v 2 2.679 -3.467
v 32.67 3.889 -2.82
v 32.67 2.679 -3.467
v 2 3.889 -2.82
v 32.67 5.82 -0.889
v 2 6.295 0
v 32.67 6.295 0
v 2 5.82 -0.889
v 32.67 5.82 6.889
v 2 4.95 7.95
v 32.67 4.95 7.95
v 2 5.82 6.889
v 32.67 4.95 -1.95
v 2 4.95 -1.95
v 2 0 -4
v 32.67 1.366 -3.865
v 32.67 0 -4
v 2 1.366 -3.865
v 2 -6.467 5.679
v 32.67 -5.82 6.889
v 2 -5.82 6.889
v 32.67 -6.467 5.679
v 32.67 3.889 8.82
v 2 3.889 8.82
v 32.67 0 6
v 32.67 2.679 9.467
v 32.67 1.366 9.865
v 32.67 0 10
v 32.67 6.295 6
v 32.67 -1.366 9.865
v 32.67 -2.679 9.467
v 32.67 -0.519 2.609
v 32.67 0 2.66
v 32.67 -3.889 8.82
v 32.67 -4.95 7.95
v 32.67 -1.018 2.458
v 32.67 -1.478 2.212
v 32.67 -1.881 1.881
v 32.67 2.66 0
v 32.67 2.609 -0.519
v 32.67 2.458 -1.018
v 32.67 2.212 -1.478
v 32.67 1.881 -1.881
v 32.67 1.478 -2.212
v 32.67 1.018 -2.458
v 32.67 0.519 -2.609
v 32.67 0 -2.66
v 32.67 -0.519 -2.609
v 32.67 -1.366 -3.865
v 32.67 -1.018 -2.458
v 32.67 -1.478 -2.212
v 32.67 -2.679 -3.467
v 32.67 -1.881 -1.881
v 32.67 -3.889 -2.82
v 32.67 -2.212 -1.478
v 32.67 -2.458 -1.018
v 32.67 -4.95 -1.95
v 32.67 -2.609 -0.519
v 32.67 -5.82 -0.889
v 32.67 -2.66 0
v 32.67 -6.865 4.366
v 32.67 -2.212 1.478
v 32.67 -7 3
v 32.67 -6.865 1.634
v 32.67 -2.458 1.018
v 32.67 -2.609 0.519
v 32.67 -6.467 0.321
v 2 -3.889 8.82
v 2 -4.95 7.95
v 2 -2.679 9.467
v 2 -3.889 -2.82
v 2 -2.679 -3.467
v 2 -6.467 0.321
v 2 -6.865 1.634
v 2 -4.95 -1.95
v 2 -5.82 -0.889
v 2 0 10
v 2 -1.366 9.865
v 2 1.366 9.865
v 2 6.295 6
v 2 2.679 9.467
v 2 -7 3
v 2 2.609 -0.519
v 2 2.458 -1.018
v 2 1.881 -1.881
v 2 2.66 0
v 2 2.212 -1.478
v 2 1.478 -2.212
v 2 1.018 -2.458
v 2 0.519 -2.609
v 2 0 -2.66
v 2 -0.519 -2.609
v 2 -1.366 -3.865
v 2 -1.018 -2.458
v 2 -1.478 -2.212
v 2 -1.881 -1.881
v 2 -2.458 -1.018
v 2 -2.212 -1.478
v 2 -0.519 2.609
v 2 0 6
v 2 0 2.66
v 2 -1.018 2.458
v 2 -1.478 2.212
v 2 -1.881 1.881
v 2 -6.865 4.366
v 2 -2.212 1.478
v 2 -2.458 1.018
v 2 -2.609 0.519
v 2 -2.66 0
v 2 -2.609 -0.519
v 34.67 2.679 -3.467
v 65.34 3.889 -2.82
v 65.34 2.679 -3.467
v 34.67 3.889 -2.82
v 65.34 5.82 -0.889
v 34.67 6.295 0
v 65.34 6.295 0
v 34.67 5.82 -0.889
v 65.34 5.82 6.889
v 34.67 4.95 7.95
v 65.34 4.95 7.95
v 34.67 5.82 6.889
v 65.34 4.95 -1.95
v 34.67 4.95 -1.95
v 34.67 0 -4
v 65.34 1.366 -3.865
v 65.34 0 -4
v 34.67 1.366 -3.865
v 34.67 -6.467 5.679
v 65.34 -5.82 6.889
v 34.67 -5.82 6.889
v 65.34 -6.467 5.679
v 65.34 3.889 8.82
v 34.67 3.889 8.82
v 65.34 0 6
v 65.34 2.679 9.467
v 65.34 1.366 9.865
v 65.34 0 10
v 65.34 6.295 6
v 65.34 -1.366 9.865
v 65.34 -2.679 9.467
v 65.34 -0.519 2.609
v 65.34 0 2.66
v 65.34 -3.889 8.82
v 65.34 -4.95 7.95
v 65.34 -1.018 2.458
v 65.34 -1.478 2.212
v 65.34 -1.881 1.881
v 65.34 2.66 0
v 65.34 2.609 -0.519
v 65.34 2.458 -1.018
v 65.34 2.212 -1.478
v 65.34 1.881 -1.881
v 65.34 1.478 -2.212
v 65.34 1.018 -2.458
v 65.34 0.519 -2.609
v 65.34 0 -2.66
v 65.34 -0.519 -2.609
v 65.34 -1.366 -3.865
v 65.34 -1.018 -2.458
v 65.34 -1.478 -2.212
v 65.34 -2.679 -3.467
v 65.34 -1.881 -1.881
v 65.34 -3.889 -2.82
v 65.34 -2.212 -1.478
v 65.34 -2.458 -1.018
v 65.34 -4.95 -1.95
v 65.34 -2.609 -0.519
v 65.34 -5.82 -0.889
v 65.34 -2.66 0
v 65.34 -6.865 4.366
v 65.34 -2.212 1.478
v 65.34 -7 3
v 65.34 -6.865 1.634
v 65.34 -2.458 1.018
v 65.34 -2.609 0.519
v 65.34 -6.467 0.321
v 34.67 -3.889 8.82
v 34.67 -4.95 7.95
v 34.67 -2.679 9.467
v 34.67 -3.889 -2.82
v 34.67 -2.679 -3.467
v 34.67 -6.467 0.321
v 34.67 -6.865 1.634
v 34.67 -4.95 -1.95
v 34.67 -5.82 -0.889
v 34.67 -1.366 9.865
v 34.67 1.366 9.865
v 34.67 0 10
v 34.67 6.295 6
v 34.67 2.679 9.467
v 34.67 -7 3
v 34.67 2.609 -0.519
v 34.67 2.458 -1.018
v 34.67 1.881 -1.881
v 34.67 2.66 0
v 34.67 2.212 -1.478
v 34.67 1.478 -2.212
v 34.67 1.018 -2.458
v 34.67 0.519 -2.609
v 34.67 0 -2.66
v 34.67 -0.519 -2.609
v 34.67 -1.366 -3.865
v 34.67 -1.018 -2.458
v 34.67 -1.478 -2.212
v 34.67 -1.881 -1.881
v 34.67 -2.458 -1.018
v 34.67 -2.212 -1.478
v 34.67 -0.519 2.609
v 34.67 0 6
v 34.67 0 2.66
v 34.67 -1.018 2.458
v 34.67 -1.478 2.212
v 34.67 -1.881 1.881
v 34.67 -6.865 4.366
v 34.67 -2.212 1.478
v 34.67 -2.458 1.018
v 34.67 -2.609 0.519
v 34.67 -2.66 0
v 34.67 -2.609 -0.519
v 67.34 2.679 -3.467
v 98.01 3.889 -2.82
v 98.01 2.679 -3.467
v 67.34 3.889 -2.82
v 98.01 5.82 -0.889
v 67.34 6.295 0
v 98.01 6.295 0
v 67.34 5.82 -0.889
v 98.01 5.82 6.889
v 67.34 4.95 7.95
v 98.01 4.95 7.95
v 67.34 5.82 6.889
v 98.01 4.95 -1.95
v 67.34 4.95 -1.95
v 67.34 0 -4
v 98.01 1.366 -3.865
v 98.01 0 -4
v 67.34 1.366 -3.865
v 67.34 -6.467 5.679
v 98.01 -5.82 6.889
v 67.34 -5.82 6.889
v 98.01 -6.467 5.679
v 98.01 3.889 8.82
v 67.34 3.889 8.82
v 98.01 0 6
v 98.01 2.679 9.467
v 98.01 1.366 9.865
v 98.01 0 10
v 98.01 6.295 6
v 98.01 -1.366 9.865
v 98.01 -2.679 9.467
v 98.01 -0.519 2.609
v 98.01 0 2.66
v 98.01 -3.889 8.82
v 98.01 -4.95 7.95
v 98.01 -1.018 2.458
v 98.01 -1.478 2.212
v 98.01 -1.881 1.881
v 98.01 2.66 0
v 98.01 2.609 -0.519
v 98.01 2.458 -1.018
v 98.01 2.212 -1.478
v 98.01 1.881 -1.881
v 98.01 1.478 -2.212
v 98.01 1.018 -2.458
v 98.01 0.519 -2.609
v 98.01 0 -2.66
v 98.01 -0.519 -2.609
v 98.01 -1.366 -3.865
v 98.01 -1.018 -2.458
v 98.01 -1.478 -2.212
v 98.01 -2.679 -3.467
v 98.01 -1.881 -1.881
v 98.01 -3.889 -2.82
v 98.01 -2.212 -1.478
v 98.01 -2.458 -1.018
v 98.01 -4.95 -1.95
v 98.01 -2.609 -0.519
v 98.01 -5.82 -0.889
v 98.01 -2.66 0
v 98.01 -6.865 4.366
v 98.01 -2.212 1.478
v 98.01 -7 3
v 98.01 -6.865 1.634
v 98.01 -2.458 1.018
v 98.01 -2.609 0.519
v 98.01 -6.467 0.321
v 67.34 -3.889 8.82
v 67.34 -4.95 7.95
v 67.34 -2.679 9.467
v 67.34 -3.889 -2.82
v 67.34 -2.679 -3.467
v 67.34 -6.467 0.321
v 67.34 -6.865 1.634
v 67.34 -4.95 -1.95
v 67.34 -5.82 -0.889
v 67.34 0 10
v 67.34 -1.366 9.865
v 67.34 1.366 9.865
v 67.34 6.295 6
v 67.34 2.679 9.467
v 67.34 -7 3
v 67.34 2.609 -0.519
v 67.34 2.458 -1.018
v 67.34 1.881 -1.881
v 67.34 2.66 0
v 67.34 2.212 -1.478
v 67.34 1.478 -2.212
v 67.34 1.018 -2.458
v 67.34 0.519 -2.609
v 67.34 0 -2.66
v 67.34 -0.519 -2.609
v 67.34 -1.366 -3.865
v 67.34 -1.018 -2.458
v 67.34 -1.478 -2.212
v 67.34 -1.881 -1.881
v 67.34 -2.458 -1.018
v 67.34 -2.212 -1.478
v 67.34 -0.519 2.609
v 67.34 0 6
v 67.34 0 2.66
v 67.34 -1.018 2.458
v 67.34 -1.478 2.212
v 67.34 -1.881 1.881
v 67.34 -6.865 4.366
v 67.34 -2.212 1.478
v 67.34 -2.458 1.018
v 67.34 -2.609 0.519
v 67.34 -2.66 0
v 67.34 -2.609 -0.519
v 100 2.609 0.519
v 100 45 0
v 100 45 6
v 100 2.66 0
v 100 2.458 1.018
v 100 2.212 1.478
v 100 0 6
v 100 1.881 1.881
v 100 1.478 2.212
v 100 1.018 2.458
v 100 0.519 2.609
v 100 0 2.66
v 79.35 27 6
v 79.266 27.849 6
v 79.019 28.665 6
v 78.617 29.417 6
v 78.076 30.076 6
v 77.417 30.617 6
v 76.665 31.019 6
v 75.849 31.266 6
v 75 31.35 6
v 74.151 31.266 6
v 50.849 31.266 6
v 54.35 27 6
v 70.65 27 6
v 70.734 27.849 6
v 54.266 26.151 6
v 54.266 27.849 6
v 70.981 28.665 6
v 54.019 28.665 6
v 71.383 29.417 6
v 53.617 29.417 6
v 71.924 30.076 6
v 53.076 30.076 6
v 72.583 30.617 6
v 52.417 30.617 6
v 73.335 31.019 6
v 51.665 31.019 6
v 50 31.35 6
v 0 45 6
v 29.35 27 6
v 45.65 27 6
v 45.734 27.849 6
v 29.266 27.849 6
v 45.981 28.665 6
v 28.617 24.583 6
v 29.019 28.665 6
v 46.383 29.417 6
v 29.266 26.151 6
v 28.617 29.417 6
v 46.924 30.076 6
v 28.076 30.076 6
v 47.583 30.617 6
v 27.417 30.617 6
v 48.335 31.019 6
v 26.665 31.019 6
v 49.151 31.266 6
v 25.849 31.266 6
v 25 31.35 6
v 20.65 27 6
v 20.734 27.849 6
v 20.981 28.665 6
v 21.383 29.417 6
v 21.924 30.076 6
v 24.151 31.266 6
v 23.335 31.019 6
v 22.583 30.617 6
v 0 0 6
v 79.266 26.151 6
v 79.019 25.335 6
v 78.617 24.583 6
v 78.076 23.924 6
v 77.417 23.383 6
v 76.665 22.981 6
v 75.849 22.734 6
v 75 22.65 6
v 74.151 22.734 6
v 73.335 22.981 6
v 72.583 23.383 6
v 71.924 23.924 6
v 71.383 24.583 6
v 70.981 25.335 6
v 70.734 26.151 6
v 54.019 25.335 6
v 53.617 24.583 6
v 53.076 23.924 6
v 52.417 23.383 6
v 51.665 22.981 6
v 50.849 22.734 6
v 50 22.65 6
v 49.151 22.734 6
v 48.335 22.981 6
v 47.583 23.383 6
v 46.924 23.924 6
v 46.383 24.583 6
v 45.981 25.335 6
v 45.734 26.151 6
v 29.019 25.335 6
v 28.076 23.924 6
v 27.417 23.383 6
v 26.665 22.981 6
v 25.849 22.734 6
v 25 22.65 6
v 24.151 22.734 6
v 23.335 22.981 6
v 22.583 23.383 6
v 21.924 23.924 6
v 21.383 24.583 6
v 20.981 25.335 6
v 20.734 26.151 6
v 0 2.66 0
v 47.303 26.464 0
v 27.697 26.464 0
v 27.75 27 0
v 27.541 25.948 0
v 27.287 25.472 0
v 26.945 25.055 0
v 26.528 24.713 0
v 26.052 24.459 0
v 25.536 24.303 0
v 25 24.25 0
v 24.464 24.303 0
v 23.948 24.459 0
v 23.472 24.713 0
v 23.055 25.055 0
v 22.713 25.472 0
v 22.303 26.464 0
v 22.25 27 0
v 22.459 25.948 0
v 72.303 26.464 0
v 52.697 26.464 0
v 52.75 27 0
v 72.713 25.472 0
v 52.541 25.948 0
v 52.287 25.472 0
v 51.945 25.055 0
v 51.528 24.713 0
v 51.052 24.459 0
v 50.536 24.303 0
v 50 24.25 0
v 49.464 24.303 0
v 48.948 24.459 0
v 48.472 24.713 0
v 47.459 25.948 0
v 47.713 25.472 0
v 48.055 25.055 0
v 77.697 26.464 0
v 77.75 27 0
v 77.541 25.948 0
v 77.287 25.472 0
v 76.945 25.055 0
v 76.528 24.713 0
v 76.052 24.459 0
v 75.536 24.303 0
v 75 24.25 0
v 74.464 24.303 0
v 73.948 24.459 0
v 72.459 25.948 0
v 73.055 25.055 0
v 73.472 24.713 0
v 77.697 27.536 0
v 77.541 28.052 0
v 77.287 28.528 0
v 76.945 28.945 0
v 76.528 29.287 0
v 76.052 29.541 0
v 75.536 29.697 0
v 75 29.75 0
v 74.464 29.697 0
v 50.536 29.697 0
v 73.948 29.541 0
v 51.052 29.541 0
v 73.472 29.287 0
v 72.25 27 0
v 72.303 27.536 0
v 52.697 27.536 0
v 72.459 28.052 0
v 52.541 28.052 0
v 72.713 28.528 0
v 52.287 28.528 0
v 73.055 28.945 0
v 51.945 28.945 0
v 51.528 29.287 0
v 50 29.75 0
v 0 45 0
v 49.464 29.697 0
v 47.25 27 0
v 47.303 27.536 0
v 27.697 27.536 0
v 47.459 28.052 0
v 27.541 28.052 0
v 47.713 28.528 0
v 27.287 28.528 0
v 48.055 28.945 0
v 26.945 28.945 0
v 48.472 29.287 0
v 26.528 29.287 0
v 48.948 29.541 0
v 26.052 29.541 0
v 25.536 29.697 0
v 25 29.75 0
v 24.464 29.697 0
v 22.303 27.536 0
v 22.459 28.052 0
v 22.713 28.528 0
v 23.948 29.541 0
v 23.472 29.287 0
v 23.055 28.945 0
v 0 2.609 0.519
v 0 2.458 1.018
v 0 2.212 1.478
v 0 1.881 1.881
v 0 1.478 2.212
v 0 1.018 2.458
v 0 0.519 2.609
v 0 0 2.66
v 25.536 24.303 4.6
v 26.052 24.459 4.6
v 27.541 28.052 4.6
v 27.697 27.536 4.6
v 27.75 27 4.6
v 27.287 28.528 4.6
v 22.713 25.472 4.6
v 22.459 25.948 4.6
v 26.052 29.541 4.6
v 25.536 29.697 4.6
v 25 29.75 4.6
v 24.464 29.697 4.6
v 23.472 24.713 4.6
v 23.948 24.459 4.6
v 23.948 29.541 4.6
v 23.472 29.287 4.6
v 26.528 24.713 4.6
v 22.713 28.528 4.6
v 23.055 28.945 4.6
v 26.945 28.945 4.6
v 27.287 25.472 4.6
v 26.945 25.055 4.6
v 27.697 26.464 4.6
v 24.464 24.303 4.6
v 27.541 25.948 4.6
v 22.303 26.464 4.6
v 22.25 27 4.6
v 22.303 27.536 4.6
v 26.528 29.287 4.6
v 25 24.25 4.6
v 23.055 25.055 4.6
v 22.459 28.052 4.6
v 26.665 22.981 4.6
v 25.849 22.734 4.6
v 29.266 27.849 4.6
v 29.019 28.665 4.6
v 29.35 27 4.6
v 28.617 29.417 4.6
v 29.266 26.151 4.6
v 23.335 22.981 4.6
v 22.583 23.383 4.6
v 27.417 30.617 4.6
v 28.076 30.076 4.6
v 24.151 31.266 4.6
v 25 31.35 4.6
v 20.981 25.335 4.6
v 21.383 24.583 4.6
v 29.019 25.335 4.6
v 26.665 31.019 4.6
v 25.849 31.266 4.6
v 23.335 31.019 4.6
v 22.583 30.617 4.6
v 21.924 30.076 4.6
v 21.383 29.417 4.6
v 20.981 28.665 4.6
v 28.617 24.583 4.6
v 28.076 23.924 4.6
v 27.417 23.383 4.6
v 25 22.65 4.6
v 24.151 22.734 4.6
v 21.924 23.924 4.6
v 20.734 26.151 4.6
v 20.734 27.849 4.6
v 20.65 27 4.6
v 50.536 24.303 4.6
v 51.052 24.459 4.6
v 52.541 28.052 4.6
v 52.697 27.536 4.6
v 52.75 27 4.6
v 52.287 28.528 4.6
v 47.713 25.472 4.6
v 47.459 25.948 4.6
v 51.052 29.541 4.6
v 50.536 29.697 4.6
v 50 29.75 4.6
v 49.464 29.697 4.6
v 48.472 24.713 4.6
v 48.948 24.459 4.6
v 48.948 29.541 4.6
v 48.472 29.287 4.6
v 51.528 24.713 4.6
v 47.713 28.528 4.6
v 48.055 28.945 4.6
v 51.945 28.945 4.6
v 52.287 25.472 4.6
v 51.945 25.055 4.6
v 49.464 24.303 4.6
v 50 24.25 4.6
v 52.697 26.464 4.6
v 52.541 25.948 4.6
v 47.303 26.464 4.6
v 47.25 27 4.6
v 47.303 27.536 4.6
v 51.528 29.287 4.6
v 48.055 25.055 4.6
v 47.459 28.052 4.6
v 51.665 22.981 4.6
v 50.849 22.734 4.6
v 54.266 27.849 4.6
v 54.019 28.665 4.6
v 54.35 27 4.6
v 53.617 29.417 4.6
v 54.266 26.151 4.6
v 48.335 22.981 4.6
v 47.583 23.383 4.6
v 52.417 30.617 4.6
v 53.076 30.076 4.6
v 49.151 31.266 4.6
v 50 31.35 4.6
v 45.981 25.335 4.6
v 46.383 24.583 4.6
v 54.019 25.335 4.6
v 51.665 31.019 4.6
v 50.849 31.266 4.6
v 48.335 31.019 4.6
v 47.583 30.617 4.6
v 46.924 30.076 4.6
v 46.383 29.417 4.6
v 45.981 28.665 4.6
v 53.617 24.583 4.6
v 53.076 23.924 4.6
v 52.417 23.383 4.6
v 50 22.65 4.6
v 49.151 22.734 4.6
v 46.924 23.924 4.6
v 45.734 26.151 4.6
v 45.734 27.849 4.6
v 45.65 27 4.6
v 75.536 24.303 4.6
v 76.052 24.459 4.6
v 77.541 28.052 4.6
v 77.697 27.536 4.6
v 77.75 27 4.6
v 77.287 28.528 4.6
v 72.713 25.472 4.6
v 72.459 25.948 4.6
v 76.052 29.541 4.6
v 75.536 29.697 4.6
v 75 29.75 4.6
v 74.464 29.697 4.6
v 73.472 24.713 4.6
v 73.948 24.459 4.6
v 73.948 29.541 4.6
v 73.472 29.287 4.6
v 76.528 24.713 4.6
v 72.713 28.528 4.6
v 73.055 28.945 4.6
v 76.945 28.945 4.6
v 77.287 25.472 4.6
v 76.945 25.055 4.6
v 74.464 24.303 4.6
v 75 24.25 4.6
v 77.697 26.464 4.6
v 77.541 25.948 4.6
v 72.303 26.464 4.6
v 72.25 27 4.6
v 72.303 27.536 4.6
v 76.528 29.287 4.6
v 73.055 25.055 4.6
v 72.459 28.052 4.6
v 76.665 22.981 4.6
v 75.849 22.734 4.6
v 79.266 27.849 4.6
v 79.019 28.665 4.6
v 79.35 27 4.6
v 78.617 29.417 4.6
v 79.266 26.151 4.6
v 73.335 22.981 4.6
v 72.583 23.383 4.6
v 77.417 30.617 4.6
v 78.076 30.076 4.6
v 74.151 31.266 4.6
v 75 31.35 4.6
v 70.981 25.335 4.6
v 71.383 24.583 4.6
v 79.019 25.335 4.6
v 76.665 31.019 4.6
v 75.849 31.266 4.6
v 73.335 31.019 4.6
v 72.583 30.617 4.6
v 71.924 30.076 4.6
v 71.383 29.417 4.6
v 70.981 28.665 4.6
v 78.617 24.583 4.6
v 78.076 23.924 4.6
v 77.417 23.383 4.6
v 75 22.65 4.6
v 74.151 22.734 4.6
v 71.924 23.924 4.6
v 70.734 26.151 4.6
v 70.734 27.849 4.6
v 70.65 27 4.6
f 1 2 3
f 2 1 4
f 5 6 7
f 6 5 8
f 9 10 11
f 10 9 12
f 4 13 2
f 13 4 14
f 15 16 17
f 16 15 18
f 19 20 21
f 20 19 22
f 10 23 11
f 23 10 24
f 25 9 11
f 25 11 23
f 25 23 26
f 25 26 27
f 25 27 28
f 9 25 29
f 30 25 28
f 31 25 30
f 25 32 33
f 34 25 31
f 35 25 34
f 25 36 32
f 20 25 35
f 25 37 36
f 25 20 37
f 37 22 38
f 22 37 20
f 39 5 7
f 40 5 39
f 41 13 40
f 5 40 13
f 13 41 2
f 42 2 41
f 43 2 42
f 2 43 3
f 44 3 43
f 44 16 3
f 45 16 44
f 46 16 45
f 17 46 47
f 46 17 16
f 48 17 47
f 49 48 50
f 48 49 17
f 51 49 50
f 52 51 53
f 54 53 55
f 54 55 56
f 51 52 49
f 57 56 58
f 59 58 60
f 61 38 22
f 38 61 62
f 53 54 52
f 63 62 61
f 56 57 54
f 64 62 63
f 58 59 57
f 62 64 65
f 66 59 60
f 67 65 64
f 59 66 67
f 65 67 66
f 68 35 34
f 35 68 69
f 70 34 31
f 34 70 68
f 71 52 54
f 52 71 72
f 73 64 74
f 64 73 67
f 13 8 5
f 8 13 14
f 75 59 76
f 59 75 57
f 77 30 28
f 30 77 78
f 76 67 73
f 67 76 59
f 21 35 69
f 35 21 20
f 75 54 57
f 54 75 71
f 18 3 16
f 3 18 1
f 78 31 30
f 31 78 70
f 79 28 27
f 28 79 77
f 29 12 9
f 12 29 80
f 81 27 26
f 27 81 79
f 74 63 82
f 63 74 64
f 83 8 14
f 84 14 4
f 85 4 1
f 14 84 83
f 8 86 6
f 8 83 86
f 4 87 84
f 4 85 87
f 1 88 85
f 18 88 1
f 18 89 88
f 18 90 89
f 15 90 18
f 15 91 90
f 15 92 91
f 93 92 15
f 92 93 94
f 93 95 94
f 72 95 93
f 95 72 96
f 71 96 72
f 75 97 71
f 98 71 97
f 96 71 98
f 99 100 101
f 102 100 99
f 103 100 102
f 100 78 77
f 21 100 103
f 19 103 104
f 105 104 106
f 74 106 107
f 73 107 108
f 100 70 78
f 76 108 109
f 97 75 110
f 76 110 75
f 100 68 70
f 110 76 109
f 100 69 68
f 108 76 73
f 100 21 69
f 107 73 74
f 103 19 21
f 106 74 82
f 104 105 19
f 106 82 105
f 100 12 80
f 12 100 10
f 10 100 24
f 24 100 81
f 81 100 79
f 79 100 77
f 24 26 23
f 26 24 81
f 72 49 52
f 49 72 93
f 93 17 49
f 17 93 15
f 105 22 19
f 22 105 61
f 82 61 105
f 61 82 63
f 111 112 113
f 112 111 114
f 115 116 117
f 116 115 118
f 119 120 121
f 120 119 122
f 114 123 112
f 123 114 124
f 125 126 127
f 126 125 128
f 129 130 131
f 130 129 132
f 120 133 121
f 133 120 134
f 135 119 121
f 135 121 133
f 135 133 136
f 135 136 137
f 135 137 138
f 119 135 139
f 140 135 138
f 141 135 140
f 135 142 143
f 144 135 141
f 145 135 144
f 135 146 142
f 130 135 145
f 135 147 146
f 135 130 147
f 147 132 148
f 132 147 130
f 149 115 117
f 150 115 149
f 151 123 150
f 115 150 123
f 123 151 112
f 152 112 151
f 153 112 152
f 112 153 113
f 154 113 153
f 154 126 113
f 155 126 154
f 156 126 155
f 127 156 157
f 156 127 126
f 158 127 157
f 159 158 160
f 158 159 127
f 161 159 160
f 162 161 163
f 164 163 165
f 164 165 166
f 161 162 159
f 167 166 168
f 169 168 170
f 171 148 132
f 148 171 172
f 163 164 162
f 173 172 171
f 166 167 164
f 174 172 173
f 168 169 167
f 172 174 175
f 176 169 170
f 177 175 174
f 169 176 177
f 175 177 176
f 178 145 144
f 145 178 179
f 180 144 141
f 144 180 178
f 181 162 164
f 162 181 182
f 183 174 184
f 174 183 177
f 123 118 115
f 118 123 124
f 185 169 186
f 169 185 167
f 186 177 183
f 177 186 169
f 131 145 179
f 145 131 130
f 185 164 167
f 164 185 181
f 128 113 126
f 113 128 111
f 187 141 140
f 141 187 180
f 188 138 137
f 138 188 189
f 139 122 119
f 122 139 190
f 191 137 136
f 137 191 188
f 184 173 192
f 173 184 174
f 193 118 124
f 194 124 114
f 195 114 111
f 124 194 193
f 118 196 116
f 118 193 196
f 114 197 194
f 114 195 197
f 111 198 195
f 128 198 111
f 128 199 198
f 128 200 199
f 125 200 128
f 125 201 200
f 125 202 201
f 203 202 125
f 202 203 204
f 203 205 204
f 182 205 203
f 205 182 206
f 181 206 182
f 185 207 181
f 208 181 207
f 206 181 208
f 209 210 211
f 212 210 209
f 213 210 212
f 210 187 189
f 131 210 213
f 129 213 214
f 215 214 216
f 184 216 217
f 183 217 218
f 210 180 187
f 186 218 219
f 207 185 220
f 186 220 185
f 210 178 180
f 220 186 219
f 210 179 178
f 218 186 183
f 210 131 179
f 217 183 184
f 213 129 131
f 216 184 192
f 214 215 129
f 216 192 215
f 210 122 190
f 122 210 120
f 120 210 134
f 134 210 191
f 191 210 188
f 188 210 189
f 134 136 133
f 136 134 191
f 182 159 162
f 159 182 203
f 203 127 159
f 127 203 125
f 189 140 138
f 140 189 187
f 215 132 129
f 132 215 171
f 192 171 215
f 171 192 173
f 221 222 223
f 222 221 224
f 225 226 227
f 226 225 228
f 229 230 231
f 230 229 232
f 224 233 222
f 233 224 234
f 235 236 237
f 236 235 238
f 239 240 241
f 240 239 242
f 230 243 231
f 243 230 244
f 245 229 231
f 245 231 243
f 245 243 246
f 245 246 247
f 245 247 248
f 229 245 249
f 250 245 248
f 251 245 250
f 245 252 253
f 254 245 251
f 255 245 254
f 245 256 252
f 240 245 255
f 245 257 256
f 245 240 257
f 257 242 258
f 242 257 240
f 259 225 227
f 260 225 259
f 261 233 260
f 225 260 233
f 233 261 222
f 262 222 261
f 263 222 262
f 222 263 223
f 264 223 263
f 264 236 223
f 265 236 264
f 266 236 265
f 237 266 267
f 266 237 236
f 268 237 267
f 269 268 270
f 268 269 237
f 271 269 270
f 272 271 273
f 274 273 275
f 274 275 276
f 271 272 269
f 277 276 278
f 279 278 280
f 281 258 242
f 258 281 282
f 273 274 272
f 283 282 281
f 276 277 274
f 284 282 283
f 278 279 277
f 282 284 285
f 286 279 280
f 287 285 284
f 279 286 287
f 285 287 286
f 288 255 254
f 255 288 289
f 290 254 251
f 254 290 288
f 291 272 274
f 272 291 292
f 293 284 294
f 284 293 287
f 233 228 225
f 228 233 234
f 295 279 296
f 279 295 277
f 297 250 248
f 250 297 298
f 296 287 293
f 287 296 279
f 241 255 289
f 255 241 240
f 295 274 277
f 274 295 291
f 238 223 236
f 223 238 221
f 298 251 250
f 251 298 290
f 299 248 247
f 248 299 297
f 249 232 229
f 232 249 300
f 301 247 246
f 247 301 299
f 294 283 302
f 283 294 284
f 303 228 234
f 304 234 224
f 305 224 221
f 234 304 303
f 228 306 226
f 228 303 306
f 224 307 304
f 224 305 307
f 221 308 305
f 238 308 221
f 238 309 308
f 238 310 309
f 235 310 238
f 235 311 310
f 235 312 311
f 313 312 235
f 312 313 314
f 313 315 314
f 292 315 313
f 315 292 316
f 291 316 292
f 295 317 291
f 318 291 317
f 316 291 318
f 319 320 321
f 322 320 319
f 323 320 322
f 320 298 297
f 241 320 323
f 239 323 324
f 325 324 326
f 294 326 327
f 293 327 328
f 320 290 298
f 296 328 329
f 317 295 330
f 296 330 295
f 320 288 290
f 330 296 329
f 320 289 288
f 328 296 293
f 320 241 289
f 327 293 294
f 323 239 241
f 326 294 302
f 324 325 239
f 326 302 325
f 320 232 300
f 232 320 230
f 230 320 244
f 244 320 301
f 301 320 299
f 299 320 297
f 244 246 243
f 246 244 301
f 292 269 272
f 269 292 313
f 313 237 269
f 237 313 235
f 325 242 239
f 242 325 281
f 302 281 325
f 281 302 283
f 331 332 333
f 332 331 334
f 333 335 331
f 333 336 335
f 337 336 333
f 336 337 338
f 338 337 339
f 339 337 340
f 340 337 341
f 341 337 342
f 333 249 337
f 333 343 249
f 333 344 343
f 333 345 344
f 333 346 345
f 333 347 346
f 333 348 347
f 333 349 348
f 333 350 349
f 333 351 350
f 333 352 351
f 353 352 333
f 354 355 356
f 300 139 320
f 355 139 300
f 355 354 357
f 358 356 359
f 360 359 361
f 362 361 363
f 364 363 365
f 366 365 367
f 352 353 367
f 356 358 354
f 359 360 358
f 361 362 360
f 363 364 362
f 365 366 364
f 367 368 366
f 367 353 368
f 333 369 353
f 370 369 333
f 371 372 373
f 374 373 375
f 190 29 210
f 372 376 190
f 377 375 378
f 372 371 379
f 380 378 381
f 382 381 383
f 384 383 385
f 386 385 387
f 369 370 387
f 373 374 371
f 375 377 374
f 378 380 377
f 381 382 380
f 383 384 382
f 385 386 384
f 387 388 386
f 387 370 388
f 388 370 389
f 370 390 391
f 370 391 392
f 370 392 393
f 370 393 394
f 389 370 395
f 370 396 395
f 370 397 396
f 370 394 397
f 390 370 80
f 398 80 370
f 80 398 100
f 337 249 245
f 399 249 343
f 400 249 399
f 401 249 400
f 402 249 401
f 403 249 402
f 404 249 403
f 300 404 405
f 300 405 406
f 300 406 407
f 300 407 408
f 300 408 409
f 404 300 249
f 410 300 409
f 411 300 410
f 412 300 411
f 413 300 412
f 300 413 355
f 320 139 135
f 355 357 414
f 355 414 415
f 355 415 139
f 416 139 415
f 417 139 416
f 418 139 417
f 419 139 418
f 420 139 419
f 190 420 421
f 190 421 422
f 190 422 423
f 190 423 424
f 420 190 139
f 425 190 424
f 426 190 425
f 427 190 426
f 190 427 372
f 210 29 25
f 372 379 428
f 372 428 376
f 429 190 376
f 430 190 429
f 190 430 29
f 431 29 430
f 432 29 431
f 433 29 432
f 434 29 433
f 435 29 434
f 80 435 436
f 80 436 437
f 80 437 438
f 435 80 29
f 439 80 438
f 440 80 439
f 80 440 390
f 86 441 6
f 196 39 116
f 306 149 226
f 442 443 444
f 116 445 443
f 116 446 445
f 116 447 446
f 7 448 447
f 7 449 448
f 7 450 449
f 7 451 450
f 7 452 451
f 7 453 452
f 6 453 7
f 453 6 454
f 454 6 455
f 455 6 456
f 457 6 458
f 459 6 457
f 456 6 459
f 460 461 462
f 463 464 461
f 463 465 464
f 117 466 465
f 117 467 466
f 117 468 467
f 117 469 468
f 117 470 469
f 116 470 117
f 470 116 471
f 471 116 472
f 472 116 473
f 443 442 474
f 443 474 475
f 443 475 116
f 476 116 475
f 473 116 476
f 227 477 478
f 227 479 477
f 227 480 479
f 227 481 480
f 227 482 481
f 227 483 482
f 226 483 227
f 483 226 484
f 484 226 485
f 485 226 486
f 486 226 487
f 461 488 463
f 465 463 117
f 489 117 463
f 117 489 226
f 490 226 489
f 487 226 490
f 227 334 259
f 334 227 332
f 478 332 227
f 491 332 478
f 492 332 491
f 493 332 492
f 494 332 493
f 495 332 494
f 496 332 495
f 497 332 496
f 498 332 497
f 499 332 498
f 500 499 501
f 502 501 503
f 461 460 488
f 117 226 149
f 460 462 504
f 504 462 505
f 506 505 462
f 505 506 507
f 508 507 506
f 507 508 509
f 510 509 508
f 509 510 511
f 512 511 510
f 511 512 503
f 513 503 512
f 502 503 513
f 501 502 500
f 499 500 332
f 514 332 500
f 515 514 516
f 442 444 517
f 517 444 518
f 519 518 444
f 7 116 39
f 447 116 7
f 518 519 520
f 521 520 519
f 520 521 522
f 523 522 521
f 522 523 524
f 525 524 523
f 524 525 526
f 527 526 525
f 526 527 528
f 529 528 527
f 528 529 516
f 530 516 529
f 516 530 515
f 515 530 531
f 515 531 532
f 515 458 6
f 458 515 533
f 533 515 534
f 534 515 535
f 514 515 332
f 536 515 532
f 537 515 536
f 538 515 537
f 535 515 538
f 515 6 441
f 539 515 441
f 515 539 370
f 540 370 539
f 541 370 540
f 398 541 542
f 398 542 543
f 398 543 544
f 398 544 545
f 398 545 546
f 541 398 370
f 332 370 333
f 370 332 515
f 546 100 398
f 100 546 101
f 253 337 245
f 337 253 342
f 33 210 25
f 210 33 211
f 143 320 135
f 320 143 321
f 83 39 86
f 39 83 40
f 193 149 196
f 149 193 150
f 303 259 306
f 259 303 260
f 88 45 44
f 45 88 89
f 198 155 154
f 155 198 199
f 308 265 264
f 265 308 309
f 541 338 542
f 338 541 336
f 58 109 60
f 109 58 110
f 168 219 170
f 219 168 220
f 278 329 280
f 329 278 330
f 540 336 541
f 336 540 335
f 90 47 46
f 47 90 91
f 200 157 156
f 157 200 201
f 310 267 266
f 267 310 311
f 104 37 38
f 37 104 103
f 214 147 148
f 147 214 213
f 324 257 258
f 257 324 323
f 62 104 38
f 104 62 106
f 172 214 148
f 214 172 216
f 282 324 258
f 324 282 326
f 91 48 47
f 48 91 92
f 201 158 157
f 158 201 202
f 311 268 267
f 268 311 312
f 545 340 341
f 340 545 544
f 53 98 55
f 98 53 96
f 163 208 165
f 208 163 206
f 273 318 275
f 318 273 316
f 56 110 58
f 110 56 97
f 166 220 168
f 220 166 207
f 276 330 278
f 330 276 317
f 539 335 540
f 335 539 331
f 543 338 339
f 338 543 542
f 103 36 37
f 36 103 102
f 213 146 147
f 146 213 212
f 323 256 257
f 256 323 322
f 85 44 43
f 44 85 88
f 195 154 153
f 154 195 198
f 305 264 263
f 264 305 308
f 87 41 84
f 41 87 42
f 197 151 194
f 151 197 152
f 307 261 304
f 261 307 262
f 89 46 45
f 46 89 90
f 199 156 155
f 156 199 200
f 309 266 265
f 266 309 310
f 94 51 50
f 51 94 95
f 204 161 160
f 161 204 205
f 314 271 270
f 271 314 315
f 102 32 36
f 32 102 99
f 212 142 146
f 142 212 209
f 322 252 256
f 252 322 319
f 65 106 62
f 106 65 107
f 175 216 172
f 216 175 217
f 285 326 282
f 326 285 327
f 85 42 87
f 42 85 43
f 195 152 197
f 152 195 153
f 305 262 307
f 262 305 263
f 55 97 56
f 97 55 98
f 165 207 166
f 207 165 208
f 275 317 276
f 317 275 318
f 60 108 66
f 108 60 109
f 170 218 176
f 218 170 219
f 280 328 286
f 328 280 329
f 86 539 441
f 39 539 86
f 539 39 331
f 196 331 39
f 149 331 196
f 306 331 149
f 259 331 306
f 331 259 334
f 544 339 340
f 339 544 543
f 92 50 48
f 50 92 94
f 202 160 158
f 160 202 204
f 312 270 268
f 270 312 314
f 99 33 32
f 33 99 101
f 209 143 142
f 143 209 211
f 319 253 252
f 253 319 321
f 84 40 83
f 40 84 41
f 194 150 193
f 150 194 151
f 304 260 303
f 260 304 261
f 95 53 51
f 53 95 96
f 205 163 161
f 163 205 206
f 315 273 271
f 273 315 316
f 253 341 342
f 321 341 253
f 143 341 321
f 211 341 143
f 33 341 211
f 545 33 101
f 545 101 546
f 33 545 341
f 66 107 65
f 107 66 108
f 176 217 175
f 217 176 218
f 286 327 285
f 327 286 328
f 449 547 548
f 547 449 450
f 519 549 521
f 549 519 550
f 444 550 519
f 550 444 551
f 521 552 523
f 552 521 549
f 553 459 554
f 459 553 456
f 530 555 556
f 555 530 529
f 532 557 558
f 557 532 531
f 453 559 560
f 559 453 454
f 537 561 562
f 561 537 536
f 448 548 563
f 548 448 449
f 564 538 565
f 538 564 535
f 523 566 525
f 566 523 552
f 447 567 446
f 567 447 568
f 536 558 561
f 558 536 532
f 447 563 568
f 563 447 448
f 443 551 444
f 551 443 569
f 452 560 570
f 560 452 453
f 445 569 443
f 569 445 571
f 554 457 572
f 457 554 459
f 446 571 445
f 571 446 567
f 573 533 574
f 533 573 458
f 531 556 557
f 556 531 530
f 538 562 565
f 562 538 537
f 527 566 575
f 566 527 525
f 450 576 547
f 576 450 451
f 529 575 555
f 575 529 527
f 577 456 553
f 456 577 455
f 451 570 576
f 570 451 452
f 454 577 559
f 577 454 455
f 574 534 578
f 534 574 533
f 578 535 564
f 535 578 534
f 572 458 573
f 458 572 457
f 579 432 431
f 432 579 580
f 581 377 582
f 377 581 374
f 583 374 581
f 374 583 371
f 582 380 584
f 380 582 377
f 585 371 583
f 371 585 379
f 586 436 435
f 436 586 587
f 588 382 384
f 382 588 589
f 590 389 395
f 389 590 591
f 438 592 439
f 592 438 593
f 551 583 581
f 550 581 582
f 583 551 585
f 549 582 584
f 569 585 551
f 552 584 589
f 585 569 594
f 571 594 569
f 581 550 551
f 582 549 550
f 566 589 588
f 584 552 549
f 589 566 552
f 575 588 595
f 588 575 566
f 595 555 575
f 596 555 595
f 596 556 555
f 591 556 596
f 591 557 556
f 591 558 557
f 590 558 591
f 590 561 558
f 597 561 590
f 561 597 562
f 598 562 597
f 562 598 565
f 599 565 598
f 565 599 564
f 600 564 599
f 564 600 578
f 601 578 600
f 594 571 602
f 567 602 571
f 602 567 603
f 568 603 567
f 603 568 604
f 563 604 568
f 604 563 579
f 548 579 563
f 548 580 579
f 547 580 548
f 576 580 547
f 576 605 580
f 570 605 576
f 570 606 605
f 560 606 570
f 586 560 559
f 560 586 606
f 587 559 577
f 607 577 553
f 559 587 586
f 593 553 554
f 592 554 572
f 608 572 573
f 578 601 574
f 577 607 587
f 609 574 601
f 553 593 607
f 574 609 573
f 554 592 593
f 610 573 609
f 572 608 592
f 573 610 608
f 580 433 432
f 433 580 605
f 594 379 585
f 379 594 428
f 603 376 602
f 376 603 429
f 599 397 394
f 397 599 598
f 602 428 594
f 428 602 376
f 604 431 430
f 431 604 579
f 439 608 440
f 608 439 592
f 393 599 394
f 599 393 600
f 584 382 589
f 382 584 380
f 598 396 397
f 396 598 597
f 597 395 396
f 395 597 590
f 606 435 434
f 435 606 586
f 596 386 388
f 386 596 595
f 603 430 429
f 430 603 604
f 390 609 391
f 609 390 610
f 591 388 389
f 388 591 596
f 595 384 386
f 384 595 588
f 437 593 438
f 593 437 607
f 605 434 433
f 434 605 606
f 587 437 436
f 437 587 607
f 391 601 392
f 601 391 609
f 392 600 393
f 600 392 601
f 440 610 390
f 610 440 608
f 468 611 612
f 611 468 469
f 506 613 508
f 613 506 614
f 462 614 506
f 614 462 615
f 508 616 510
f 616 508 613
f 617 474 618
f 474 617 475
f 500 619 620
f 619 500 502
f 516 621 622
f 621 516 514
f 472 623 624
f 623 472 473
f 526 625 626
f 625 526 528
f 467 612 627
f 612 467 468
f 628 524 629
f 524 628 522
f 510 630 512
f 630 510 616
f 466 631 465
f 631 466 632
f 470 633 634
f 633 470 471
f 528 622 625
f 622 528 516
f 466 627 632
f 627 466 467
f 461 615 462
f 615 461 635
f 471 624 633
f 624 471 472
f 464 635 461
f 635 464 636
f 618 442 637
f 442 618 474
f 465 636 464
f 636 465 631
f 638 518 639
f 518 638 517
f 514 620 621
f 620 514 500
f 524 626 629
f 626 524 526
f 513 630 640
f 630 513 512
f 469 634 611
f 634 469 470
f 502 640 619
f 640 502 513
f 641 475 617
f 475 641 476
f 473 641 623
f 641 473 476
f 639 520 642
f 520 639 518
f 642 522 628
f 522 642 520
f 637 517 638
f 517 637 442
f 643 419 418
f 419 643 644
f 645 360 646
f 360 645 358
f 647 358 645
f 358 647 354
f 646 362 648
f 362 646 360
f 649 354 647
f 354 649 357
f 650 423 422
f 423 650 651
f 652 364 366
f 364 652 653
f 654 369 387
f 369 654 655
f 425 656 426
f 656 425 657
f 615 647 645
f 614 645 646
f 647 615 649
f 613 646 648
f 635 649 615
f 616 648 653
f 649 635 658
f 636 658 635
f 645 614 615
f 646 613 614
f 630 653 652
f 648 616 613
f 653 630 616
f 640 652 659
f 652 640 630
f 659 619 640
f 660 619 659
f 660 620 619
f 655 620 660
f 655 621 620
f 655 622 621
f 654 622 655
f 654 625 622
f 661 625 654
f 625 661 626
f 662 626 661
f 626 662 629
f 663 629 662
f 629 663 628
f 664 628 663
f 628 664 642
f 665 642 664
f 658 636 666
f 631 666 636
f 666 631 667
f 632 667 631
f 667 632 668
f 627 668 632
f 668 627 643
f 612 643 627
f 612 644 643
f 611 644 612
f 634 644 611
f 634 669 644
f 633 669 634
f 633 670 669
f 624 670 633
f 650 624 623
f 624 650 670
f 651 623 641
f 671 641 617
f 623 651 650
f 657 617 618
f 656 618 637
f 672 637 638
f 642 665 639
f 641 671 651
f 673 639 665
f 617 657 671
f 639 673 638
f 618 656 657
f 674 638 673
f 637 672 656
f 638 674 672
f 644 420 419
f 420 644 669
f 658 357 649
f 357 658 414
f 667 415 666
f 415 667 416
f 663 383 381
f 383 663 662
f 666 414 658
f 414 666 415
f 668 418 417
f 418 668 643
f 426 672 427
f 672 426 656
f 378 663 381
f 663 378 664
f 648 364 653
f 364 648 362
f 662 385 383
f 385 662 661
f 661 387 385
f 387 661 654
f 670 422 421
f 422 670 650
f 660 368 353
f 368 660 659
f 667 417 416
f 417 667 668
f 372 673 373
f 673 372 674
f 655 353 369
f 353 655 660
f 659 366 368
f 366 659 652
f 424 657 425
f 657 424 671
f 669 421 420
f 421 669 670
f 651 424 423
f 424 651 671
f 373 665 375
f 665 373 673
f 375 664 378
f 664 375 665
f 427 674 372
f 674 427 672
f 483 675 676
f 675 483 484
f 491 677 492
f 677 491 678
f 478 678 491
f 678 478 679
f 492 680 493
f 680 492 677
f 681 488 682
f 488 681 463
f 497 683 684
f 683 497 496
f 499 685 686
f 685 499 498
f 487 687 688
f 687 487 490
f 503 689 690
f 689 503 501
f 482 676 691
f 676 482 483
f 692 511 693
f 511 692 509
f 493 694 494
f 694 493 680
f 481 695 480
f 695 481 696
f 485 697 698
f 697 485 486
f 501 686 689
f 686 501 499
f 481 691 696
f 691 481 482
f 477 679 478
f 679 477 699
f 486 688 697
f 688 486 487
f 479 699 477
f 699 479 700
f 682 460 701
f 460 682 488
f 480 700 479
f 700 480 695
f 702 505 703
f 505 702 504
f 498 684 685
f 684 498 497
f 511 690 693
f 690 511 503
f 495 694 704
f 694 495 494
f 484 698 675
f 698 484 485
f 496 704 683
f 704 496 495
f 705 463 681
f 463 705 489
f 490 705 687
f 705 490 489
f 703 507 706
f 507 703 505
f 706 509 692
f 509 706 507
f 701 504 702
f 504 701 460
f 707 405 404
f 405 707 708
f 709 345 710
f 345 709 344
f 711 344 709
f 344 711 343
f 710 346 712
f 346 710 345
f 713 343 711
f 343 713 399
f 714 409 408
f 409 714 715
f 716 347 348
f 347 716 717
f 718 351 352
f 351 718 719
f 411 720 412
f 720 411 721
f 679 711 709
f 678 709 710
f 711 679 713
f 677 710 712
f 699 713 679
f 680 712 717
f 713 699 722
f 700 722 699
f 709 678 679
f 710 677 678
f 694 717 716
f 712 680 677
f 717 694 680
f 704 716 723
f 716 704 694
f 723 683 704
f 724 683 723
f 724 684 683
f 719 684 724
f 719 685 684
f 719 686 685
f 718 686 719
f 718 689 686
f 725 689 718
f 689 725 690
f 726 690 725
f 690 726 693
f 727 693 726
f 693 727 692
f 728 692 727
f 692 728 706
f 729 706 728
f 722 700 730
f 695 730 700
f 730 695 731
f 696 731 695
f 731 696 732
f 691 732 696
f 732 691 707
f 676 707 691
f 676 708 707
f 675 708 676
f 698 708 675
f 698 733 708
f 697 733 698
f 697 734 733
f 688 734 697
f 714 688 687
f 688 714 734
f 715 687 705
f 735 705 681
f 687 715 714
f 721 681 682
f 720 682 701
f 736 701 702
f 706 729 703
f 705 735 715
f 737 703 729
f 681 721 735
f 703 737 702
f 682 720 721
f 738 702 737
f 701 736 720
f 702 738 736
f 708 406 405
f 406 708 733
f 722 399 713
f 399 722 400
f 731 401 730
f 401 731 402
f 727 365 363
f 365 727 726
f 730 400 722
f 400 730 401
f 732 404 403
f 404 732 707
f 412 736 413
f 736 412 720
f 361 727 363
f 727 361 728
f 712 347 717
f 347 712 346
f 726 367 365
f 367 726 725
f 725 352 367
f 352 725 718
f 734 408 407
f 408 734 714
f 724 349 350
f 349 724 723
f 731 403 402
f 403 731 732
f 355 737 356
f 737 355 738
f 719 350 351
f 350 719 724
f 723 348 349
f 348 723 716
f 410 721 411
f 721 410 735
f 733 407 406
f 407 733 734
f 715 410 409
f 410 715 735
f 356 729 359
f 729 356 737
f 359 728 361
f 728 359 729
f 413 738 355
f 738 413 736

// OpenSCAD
$fn = 32;

// ----------------------------------------------------------------------
// Hinge leaf: 100 x 52 x 14 mm
// ----------------------------------------------------------------------

// --- parameters (mm) ---
leaf_len = 100;           // leaf length, X
leaf_w = 45;              // leaf width, Y
leaf_t = 6;               // leaf thickness
knuckle_d = 14;           // knuckle diameter
knuckle_w = 30.67;        // knuckle width
knuckle_n = 3;            // number of knuckles
pin_d = 5.32;             // pin bore
gap = 2;                  // gap between the knuckles
screw_d = 5.5;            // screw clearance
cs_d = 8.7;               // countersink diameter
cs_h = 1.4;               // countersink depth

module leaf() {
  cube([leaf_len, leaf_w, leaf_t]);
}

module knuckles() {
  /* barrels sit on the leaf edge, the pin axis at half the leaf thickness */
  for (i = [0 : knuckle_n - 1])
    translate([gap + i * (knuckle_w + gap), 0, leaf_t * 0.5])
      rotate([0, 90, 0]) cylinder(h = knuckle_w, d = knuckle_d);
}

difference() {
  union() {
    leaf();
    knuckles();
  }
  rotate([0, 90, 0]) translate([0, 0, -1])
    cylinder(h = leaf_len + 2, d = pin_d);
  translate([25, leaf_w * 0.6, -1]) cylinder(h = leaf_t + 2, d = screw_d);
  translate([25, leaf_w * 0.6, leaf_t - cs_h]) cylinder(h = cs_h + 0.5, d = cs_d);
  translate([50, leaf_w * 0.6, -1]) cylinder(h = leaf_t + 2, d = screw_d);
  translate([50, leaf_w * 0.6, leaf_t - cs_h]) cylinder(h = cs_h + 0.5, d = cs_d);
  translate([75, leaf_w * 0.6, -1]) cylinder(h = leaf_t + 2, d = screw_d);
  translate([75, leaf_w * 0.6, leaf_t - cs_h]) cylinder(h = cs_h + 0.5, d = cs_d);
}
